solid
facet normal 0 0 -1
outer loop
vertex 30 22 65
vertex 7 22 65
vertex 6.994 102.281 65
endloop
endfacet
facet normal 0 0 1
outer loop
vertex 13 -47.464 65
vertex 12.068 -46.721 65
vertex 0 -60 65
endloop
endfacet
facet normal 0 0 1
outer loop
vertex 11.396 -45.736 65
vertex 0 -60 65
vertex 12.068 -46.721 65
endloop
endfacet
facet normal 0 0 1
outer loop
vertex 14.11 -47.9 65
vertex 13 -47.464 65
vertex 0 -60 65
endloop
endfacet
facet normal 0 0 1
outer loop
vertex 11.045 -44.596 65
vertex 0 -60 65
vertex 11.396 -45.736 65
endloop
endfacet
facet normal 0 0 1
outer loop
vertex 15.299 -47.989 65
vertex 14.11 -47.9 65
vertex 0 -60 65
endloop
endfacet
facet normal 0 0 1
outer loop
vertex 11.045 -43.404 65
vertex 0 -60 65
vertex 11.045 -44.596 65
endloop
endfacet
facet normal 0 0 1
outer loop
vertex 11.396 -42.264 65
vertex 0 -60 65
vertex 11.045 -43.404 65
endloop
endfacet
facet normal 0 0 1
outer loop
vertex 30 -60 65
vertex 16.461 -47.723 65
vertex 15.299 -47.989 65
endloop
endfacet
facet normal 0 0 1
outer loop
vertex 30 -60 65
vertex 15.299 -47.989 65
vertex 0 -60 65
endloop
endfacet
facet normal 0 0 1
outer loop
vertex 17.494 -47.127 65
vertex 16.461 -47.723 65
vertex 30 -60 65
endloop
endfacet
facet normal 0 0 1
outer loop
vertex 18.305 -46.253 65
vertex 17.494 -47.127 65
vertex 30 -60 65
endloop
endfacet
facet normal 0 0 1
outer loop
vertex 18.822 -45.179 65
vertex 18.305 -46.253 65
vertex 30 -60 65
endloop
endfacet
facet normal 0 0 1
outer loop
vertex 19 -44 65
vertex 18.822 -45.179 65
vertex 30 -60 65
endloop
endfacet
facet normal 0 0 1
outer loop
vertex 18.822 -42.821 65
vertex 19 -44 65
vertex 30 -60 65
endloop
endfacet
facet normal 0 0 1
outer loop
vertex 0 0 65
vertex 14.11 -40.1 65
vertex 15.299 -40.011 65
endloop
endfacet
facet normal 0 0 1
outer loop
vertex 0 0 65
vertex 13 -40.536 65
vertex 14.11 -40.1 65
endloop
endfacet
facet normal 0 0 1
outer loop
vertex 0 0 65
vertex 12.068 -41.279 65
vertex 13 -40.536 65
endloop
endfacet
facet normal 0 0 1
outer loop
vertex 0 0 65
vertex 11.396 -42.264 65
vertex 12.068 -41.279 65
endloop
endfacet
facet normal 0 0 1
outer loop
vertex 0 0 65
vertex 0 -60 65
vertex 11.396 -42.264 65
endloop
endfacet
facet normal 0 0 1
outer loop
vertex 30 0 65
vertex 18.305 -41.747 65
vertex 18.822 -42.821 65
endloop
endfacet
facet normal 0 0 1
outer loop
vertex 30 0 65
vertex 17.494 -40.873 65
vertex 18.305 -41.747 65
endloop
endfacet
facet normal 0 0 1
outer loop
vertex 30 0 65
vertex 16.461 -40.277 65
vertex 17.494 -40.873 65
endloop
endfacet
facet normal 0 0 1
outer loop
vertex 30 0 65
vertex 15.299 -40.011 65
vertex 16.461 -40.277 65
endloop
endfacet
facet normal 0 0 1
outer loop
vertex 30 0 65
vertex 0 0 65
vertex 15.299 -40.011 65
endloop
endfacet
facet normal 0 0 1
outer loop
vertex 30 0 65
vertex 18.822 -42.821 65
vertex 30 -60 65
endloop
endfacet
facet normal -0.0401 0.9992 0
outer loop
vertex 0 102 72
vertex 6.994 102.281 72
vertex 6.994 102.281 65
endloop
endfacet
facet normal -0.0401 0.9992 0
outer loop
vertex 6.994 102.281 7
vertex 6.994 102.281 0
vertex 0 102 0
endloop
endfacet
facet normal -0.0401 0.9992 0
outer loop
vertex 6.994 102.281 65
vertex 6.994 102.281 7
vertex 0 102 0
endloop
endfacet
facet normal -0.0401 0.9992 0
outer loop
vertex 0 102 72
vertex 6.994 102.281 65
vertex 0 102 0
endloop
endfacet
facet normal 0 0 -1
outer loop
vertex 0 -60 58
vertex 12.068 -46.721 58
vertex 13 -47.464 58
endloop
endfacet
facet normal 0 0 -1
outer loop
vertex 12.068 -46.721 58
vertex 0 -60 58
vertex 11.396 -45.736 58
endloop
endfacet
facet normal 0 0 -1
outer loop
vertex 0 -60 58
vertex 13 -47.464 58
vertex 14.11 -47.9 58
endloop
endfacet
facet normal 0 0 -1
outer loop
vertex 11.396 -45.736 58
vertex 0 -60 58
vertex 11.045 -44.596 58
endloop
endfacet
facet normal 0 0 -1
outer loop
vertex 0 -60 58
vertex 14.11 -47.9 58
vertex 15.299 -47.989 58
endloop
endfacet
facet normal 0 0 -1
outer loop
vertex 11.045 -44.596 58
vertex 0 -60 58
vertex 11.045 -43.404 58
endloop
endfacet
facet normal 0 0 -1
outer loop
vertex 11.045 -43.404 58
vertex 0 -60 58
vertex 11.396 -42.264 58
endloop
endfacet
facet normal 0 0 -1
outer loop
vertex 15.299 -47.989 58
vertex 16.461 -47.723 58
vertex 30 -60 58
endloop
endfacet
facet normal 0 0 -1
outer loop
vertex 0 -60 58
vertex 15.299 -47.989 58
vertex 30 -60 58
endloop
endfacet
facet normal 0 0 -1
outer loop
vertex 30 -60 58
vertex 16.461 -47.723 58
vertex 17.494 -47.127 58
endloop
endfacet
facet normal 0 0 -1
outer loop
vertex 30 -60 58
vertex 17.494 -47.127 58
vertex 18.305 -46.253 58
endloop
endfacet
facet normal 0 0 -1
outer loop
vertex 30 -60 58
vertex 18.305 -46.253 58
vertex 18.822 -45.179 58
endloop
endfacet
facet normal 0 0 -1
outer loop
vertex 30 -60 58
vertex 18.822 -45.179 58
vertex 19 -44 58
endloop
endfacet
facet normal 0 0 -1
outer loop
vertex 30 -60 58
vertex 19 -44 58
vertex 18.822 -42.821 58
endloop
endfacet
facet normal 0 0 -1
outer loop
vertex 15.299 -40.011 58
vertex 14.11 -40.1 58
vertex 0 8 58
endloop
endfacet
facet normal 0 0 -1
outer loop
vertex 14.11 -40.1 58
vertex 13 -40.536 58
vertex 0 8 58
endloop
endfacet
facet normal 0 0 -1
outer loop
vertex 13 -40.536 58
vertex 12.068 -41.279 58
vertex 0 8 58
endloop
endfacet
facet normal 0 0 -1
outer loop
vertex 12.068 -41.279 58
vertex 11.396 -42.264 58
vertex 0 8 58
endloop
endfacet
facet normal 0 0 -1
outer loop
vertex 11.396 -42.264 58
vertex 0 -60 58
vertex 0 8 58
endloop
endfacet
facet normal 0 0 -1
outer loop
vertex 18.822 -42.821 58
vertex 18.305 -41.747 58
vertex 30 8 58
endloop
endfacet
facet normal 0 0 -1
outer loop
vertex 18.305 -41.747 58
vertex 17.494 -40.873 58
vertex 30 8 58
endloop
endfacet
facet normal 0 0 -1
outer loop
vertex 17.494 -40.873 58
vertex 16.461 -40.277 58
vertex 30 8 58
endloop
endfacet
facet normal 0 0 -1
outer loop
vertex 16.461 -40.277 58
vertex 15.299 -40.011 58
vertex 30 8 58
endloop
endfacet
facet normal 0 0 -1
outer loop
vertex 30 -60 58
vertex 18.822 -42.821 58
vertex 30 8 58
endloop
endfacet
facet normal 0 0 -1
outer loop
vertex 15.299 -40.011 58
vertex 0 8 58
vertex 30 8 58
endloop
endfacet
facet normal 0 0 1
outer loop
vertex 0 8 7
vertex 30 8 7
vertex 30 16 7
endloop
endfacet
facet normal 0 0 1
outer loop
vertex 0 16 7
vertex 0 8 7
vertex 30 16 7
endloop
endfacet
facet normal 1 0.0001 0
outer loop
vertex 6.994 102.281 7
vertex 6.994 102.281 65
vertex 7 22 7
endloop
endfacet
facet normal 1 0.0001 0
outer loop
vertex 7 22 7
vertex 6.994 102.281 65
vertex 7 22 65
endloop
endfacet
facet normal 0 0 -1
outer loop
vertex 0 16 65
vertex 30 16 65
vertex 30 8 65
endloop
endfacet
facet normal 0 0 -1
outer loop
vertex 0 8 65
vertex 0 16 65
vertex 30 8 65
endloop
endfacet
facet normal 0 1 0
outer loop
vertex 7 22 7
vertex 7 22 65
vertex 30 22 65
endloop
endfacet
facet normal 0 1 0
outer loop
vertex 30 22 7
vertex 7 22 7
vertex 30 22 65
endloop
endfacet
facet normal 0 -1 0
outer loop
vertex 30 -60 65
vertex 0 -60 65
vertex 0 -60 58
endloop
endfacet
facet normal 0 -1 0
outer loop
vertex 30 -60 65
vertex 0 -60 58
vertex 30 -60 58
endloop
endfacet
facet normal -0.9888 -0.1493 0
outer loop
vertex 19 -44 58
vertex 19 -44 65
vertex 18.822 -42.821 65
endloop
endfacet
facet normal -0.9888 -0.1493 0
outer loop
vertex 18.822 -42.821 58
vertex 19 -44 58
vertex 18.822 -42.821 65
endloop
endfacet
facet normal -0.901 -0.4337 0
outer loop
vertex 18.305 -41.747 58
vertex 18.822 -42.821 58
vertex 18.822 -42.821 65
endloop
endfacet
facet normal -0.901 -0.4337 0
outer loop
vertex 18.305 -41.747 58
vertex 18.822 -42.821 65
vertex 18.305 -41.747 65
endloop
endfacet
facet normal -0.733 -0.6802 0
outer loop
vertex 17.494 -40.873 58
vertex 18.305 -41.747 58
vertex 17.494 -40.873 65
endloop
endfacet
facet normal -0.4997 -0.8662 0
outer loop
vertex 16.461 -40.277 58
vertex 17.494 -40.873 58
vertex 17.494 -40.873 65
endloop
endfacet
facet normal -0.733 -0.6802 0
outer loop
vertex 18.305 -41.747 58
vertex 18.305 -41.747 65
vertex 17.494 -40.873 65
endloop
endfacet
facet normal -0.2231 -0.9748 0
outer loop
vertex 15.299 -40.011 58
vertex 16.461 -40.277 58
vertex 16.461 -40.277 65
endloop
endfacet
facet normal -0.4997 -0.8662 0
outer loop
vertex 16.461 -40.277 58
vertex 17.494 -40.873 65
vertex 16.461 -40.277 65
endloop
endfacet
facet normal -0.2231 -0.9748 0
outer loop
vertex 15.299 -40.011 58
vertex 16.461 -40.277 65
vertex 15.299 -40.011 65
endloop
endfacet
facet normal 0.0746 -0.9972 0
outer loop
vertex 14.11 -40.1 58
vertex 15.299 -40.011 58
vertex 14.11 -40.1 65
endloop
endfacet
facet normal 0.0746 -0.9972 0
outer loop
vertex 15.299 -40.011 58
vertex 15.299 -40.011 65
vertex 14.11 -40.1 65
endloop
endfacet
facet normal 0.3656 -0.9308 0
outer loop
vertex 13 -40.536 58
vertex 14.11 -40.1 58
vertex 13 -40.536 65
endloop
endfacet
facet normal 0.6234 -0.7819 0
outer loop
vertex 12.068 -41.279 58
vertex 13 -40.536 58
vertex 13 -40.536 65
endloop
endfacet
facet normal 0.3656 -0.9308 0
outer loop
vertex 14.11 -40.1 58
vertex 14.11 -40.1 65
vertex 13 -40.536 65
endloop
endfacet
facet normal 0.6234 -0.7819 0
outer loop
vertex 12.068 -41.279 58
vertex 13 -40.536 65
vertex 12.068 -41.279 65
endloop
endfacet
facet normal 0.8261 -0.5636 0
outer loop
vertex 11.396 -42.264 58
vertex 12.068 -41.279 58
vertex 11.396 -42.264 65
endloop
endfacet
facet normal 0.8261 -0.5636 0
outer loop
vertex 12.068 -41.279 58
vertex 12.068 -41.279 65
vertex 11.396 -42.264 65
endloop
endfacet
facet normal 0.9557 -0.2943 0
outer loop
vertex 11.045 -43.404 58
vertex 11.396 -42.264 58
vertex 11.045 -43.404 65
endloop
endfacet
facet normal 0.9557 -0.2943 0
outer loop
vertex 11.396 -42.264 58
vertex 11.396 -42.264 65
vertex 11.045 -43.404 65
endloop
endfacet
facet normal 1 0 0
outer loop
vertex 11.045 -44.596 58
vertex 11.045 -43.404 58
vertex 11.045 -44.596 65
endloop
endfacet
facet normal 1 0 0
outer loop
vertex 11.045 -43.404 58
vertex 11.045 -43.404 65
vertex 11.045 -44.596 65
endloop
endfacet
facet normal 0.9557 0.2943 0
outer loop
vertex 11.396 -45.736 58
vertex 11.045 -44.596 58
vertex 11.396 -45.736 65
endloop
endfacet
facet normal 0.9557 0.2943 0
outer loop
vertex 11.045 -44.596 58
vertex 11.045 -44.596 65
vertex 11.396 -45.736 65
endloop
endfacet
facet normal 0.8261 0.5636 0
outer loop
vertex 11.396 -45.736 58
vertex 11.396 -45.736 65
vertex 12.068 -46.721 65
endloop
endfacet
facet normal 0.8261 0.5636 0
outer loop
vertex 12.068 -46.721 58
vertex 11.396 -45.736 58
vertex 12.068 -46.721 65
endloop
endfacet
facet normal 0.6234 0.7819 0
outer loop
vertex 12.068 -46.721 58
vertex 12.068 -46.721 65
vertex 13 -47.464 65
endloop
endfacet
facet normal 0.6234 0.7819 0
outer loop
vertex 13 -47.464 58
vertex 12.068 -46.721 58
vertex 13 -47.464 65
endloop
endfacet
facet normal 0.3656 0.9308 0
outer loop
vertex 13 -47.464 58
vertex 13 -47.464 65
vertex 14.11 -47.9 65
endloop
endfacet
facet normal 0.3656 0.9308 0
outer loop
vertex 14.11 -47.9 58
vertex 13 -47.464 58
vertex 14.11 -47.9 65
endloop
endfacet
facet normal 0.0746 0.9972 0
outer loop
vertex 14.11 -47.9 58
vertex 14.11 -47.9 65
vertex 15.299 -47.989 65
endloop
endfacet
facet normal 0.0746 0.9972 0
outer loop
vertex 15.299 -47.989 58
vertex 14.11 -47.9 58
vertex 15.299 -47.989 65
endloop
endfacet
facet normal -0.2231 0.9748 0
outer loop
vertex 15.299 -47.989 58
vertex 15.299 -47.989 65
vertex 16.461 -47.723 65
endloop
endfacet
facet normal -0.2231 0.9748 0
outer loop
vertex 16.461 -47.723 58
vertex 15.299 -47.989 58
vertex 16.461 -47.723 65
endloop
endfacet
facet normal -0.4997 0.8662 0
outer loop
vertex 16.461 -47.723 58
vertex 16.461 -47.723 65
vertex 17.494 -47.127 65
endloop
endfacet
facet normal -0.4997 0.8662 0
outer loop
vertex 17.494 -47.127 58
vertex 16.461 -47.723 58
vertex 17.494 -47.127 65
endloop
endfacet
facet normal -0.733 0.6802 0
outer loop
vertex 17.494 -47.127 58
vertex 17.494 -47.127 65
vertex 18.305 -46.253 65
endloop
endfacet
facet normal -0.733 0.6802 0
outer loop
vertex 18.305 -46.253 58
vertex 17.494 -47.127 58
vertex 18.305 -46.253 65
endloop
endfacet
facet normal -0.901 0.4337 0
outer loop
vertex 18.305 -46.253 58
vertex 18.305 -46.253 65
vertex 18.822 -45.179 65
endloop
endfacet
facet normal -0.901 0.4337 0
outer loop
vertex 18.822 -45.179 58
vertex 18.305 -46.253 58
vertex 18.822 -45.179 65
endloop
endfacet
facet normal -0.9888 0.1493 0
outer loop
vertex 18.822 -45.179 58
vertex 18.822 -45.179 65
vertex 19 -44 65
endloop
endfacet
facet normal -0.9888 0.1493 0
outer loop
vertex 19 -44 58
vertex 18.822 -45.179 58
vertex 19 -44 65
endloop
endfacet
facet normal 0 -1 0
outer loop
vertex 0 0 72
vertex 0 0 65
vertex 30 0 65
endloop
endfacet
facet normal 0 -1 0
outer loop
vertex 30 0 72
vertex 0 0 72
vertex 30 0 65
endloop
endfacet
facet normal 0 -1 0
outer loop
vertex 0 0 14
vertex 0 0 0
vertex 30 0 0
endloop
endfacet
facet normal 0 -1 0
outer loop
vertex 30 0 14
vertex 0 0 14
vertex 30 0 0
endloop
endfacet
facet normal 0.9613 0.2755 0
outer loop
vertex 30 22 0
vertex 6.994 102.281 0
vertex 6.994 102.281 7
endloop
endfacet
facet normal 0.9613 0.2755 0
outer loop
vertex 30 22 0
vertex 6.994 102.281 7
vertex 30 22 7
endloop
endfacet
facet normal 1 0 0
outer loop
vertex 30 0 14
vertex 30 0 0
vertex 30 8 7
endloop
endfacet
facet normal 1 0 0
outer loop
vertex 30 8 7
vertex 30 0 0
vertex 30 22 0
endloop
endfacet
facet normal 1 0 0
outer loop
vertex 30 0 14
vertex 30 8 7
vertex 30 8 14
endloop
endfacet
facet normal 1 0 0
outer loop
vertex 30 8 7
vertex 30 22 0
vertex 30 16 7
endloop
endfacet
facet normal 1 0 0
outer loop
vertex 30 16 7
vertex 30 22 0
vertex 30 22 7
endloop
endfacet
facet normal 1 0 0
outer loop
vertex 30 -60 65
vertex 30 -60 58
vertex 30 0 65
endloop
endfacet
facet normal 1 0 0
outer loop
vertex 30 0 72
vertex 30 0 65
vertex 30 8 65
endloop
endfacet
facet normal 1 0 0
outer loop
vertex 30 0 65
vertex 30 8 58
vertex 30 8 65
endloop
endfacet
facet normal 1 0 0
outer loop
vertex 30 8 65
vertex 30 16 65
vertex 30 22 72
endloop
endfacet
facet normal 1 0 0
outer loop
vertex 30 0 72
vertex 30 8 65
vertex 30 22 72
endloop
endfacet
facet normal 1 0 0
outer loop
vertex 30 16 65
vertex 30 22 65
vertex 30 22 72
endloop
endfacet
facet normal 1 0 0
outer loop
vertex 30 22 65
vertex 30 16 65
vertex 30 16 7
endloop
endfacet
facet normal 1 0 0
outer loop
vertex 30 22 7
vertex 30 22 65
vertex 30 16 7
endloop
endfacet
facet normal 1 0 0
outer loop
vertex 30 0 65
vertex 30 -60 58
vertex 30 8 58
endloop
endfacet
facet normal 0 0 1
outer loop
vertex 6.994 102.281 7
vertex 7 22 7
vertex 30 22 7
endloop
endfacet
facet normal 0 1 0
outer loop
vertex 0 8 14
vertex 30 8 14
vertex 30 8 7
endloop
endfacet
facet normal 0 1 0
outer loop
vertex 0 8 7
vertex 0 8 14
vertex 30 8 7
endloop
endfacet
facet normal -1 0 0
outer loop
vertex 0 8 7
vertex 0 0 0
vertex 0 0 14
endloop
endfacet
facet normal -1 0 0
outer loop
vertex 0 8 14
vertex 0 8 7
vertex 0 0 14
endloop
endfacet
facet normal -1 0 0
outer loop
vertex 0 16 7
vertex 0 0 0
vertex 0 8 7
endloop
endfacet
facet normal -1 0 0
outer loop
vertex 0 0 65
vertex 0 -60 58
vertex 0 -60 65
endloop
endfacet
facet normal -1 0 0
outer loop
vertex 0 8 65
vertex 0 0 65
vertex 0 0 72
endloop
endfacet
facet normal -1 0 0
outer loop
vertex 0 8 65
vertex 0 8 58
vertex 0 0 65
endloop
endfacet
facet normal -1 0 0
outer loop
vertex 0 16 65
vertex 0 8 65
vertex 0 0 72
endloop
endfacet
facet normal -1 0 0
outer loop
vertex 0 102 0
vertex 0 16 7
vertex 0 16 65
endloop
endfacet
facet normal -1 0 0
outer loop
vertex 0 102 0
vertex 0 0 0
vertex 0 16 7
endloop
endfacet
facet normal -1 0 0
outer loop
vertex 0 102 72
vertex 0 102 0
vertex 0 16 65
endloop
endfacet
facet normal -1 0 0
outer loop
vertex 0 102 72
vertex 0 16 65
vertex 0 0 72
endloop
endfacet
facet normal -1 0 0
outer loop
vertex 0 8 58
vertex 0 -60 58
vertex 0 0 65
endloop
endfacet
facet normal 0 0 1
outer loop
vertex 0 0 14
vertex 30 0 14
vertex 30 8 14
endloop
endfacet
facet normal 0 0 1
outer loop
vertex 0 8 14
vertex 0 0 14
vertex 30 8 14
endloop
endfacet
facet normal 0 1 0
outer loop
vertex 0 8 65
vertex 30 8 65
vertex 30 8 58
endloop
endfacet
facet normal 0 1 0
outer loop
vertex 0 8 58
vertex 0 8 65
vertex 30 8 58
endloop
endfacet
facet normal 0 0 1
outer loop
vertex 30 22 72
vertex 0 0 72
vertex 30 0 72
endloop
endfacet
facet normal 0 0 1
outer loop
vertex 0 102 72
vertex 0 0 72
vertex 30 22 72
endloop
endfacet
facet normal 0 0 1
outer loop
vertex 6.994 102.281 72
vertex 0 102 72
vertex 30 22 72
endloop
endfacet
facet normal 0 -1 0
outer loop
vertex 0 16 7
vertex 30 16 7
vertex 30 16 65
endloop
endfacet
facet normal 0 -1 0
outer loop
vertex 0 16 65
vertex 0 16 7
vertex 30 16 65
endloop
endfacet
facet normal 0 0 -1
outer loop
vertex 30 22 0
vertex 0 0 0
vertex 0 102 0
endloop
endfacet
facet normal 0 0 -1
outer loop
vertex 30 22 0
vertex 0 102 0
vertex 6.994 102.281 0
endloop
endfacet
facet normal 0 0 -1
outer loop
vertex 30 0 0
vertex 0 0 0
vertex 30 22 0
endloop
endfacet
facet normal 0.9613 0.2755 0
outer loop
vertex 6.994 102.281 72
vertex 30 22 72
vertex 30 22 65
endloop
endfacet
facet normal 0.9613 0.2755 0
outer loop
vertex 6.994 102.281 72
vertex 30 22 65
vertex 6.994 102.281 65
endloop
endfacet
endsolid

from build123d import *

# Parameters (mm, degrees)
F0_W      = 30
F0_H      = 22
F1_DEPTH  = 72
F3_DEPTH  = 72.001
F4_DEPTH  = 7
F6_DEPTH  = 7
F7_W      = 8
F7_H      = 44
F8_DEPTH  = 30.001
F9_W      = 30
F9_H      = 7
F10_DEPTH = 60
F11_R     = 4
F12_DEPTH = 65.001


with BuildPart() as f1:
    # F0 (on Top) → F1 (new body)
    with BuildSketch(Plane.XY):
        with Locations((15, 11)):
            Rectangle(F0_W, F0_H)
        Polygon((0, 102), (0, 22), (30, 22), (6.9943696583, 102.2807010551), align=None)
    extrude(amount=F1_DEPTH)

    # F2 (on face) → F3 (cut, through all)
    with BuildSketch(Plane.XY.offset(72)):
        Polygon((7, 22), (30, 22), (6.9943696583, 102.2807010551), align=None)
    extrude(amount=-F3_DEPTH, mode=Mode.SUBTRACT)

    # F2 (on face) → F4 (join)
    with BuildSketch(Plane.XY.offset(72)):
        Polygon((7, 22), (30, 22), (6.9943696583, 102.2807010551), align=None)
    extrude(amount=-F4_DEPTH)

    # F5 (on face) → F6 (join)
    with BuildSketch(Plane(origin=(0, 0, 0), x_dir=(1, 0, 0), z_dir=(0, 0, -1))):
        Polygon((6.9943696583, -102.2807010551), (30, -22), (7, -22), align=None)
    extrude(amount=-F6_DEPTH)

    # F7 (on face) → F8 (cut, through all)
    with BuildSketch(Plane.YZ.offset(30)):
        Polygon((16, 65), (8, 65), (8, 58), (8, 14), (8, 7), (16, 7), align=None)
        with Locations((4, 36)):
            Rectangle(F7_W, F7_H)
    extrude(amount=-F8_DEPTH, mode=Mode.SUBTRACT)

    # F9 (on face) → F10 (join)
    with BuildSketch(Plane.XZ):
        with Locations((15, 61.5)):
            Rectangle(F9_W, F9_H)
    extrude(amount=F10_DEPTH)

    # F11 (on face) → F12 (cut, through all)
    with BuildSketch(Plane.XY.offset(65)):
        with Locations((15, -44)):
            Circle(F11_R)
    extrude(amount=-F12_DEPTH, mode=Mode.SUBTRACT)


solid = f1.part
